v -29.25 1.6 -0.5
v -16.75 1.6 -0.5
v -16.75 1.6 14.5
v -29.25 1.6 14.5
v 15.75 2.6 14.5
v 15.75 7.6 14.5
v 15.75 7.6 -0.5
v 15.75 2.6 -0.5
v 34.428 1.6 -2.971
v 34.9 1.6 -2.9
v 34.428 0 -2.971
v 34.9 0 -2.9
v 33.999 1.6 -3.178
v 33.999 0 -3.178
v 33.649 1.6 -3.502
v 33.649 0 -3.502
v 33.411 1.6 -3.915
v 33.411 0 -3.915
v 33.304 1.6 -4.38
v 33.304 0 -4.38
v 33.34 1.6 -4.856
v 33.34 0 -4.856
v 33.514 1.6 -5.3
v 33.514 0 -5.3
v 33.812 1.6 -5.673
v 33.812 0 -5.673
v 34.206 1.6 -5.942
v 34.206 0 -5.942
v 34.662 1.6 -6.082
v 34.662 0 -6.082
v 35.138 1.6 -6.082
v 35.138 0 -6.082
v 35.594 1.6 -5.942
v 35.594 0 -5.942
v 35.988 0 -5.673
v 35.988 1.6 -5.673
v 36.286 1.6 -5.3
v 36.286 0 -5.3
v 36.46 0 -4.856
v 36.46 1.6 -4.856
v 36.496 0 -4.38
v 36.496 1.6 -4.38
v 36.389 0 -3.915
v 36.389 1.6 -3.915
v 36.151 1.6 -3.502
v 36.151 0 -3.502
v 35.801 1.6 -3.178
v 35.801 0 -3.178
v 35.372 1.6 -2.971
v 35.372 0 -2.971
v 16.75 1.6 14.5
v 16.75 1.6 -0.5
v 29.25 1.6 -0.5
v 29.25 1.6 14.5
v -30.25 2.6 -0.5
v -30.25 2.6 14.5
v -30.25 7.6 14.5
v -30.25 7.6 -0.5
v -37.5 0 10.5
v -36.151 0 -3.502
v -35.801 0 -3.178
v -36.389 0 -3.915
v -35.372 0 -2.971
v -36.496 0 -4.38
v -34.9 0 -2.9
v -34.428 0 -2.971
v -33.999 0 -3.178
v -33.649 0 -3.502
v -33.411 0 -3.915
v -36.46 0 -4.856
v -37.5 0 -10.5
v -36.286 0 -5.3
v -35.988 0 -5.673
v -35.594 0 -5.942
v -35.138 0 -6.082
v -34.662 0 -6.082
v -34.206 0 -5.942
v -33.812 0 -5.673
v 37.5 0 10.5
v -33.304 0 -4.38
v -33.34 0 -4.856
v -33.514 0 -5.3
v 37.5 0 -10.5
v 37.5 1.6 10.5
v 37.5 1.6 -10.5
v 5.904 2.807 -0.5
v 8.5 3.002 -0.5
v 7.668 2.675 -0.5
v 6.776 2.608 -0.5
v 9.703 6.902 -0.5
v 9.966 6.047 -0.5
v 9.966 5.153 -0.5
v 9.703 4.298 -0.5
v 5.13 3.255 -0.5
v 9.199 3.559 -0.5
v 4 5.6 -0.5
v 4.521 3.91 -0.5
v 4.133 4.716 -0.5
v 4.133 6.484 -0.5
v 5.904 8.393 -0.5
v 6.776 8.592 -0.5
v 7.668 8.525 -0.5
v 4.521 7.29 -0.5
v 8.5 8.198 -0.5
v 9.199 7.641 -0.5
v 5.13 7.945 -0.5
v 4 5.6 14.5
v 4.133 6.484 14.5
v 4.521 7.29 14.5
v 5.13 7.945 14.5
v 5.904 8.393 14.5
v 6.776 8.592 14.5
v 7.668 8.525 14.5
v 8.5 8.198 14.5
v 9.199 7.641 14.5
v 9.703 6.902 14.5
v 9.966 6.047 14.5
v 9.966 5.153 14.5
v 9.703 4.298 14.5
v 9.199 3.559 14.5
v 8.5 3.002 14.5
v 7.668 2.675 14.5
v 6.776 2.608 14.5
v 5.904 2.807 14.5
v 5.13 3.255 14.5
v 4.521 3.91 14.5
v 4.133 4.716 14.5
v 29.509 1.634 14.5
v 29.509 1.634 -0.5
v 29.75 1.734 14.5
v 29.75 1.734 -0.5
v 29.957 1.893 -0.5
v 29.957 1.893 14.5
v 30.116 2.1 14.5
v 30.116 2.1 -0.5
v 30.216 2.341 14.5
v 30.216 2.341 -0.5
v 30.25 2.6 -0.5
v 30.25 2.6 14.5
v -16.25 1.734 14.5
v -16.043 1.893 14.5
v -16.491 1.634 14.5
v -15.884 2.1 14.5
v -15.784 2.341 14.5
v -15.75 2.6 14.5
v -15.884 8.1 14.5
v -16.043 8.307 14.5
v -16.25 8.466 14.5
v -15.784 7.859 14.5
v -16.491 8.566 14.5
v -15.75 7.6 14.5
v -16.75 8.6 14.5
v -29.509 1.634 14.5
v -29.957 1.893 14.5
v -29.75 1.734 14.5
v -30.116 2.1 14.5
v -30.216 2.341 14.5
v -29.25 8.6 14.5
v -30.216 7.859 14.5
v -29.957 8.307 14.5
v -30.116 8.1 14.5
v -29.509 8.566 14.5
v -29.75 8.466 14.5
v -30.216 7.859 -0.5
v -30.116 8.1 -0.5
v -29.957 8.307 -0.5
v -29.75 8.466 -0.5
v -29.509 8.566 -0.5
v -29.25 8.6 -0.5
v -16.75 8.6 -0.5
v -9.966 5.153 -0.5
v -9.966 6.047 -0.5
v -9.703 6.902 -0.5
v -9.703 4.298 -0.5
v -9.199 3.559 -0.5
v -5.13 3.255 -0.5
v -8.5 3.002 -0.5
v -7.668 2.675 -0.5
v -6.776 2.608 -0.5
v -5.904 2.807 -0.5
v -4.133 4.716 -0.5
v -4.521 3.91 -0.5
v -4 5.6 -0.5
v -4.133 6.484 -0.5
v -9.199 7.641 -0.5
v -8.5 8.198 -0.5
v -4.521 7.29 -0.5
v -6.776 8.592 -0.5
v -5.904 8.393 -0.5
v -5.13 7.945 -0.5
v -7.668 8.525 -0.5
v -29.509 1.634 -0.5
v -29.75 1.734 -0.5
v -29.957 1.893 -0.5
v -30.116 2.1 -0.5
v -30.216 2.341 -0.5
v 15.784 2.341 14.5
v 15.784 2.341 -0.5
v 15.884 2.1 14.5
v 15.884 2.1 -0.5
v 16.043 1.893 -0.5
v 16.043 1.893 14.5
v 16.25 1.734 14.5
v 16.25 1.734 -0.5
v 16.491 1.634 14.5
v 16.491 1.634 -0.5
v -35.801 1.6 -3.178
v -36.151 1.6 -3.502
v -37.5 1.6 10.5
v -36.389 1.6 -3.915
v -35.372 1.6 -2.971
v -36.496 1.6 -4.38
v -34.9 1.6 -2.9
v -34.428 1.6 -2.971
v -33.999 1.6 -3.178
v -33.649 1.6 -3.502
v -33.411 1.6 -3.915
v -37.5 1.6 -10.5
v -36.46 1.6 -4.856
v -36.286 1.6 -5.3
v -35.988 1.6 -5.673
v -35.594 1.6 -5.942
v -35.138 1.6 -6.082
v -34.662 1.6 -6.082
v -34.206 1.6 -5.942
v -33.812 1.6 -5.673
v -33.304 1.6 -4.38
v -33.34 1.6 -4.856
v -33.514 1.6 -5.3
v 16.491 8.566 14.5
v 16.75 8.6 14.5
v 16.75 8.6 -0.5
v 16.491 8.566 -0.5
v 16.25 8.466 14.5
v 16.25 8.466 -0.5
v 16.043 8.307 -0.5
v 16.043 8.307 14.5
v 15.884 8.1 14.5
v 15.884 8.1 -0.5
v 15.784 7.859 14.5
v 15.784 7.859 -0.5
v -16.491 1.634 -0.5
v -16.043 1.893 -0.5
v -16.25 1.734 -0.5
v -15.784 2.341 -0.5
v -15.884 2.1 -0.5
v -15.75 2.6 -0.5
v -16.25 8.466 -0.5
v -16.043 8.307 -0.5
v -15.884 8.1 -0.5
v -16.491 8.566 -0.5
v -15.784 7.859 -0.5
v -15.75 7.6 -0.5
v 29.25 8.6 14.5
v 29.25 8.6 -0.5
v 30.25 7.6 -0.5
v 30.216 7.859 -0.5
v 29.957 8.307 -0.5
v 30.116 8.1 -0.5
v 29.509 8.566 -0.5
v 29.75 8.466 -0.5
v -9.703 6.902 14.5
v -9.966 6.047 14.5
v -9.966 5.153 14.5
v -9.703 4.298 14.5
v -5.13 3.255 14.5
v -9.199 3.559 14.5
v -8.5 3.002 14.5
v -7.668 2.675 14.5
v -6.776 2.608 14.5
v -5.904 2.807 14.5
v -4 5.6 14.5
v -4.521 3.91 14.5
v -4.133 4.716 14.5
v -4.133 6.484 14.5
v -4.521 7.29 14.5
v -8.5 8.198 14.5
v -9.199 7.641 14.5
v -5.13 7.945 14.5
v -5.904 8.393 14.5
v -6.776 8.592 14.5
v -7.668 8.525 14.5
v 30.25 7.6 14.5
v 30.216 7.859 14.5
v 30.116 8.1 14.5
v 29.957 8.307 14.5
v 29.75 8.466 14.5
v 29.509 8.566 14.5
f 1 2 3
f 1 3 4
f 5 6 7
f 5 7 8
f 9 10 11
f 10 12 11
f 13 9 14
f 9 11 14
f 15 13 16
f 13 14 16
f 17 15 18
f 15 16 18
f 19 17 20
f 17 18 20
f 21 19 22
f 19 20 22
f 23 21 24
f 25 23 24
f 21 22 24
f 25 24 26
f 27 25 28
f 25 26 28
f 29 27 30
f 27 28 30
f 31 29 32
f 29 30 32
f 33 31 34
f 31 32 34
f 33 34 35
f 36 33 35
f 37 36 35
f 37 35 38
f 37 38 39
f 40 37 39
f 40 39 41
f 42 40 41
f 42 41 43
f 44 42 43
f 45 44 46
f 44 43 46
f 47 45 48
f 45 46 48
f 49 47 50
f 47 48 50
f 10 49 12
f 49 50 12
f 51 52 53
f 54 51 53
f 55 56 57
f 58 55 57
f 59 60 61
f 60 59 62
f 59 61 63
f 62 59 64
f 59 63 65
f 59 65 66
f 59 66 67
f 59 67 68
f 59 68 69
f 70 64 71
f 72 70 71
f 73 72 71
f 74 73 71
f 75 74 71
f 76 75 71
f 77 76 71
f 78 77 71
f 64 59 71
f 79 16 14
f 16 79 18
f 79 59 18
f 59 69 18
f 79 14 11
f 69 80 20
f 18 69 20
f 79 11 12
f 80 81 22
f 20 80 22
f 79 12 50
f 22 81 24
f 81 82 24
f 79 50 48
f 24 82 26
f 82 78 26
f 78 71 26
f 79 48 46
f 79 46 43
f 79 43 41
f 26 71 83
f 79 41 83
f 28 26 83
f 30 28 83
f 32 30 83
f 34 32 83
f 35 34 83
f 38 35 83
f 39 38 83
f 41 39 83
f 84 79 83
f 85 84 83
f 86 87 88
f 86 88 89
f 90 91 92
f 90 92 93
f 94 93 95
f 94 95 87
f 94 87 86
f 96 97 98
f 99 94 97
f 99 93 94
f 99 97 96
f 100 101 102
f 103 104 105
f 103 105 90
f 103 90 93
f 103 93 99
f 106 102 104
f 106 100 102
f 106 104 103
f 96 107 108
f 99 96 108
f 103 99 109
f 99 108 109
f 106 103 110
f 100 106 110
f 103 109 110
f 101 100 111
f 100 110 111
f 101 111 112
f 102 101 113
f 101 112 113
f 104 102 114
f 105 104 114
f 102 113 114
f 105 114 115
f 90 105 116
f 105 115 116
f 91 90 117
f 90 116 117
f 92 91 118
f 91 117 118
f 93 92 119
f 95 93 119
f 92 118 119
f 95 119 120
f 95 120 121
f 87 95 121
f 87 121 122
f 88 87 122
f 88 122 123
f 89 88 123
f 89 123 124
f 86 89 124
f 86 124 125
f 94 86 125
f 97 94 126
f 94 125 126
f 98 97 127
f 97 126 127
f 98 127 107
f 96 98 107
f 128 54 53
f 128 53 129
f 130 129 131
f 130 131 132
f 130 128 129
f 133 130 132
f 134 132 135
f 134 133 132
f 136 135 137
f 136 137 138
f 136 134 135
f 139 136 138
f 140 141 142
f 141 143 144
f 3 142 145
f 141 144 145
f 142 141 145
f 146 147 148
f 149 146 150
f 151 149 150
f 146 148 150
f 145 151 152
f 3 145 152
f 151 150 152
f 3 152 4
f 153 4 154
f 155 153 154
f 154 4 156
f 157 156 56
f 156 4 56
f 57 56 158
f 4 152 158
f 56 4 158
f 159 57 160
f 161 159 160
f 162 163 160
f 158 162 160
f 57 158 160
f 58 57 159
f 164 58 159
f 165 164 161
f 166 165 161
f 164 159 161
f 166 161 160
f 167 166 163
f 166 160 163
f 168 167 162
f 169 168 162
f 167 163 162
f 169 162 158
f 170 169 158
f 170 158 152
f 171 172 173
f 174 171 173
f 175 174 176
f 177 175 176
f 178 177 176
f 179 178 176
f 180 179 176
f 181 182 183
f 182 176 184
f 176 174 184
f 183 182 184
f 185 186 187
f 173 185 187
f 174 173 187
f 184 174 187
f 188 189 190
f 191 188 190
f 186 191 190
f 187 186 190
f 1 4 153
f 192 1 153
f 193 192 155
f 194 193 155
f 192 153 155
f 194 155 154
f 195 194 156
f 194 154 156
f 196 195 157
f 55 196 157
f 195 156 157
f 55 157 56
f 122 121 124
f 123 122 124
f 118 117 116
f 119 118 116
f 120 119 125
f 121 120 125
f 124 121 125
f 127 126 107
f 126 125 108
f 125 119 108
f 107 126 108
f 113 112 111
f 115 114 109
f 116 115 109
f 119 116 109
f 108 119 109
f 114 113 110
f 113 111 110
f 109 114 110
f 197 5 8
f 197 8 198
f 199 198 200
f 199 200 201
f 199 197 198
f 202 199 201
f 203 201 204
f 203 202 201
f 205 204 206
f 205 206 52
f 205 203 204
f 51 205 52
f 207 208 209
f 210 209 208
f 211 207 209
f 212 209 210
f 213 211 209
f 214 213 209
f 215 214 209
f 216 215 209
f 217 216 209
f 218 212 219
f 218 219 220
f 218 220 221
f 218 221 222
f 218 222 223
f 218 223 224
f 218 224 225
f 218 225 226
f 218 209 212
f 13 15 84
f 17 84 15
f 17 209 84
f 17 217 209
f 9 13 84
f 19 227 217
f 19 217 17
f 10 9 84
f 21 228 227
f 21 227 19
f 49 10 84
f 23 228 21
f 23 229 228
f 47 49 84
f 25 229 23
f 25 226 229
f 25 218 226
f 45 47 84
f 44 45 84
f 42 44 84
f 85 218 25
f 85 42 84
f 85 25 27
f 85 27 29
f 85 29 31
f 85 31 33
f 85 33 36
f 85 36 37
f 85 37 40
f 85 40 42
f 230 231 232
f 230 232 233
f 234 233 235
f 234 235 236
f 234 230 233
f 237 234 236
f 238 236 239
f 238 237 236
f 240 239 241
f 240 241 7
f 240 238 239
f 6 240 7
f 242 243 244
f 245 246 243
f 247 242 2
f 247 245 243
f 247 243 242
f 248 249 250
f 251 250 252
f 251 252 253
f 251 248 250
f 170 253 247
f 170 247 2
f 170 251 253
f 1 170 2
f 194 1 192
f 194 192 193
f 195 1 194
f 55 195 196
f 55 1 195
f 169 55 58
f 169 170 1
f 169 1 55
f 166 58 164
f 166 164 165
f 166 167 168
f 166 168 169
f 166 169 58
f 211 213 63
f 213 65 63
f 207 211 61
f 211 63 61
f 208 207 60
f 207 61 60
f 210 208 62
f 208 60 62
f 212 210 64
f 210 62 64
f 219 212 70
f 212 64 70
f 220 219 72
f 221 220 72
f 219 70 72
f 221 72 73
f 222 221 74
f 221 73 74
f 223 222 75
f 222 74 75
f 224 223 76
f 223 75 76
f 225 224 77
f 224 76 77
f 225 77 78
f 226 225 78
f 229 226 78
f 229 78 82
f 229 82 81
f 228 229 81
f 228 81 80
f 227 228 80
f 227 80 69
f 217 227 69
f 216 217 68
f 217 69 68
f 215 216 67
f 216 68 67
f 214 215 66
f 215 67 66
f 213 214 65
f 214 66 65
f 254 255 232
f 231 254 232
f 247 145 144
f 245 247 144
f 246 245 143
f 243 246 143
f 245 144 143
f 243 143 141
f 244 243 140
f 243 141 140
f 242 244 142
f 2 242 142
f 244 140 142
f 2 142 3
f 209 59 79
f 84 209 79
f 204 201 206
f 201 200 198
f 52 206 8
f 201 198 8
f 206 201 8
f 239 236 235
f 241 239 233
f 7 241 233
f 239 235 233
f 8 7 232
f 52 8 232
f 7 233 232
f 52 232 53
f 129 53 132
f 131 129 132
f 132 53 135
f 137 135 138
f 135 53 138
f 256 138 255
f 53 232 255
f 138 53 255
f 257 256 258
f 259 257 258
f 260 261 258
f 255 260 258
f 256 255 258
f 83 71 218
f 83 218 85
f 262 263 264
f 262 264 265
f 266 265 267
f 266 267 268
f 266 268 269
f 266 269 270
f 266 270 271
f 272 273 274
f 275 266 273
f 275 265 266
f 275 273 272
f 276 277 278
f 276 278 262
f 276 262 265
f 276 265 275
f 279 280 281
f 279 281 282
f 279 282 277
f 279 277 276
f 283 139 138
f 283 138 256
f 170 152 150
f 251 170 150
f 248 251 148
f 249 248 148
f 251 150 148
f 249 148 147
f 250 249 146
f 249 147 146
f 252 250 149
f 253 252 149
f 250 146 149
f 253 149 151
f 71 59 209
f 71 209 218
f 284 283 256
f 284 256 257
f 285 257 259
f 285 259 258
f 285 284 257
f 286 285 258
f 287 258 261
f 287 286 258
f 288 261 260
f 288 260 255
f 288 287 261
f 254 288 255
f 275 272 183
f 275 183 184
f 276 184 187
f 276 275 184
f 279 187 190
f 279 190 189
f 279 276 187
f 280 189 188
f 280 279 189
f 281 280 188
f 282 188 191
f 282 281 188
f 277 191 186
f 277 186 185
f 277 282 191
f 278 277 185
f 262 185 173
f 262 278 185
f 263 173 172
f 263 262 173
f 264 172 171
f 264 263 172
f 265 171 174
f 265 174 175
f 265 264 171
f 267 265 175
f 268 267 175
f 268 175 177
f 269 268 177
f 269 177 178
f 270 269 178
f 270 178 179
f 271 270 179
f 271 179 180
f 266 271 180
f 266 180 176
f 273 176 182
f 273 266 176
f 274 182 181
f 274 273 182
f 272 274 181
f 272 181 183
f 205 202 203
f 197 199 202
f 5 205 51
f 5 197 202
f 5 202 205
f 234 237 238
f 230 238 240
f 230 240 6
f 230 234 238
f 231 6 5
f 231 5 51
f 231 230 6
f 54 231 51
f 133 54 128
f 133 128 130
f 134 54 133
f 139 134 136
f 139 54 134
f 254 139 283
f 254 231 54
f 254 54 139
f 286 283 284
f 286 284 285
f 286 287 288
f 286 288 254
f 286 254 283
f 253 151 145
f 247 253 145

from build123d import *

# Parameters (mm, degrees)
SKETCH1_W                     = 75
SKETCH1_H                     = 21
BOSS_EXTRUDE1_DEPTH           = 1.6
SKETCH2_R                     = 3
BOSS_EXTRUDE2_DEPTH           = 15
BOSS_EXTRUDE2_2_DEPTH         = 15
SKETCH4_W                     = 1.6
SKETCH4_H                     = 1.6
M3_CLEARANCE_HOLE1_AT_2_COUNT = 2
M3_CLEARANCE_HOLE1_AT_2_PITCH = 69.8


with BuildPart() as part:
    # Sketch1 → Boss-Extrude1 (new body)
    with BuildSketch(Plane(origin=(0, 0, 0), x_dir=(1, 0, 0), z_dir=(0, 1, 0))):
        Rectangle(SKETCH1_W, SKETCH1_H)
    extrude(amount=BOSS_EXTRUDE1_DEPTH)

    # Sketch4 → M3 Clearance Hole1 (revolve, cut)
    with BuildSketch(Plane(origin=(-34.9, 1.6, -4.5), x_dir=(0, 0, 1), z_dir=(1, 0, 0))):
        with Locations((0.8, 0.8)):
            Rectangle(SKETCH4_W, SKETCH4_H)
    m3_clearance_hole1 = revolve(axis=Axis((-34.9, 7.95, -4.5), (0, -1, 0)), mode=Mode.SUBTRACT)

    # M3 Clearance Hole1 at 2: M3 Clearance Hole1 ×2
    with Locations(*[(i * M3_CLEARANCE_HOLE1_AT_2_PITCH, 0, 0) for i in range(1, M3_CLEARANCE_HOLE1_AT_2_COUNT)]):
        add(m3_clearance_hole1, mode=Mode.SUBTRACT)


with BuildPart() as body_2:
    # Sketch2 → Boss-Extrude2 (new body)
    with BuildSketch(Plane.XY.offset(14.5)):
        with Locations((-7, 5.6)):
            Circle(SKETCH2_R)
    extrude(amount=-BOSS_EXTRUDE2_DEPTH)


with BuildPart() as body_3:
    # Sketch2 → Boss-Extrude2 2 (new body)
    with BuildSketch(Plane.XY.offset(14.5)):
        with BuildLine():
            Line((-29.25, 8.6), (-16.75, 8.6))
            ThreePointArc((-16.75, 8.6), (-16.042893219, 8.307106781), (-15.75, 7.6))
            Line((-15.75, 7.6), (-15.75, 2.6))
            ThreePointArc((-15.75, 2.6), (-16.042893219, 1.892893219), (-16.75, 1.6))
            Line((-16.75, 1.6), (-29.25, 1.6))
            ThreePointArc((-29.25, 1.6), (-29.957106781, 1.892893219), (-30.25, 2.6))
            Line((-30.25, 2.6), (-30.25, 7.6))
            ThreePointArc((-30.25, 7.6), (-29.957106781, 8.307106781), (-29.25, 8.6))
        make_face()
    extrude(amount=-BOSS_EXTRUDE2_2_DEPTH)


with BuildPart() as body_4:
    # Mirror13: mirrored copy
    add(body_3.part.mirror(Plane.ZY))


with BuildPart() as body_5:
    # Mirror13 2: mirrored copy
    add(body_2.part.mirror(Plane.ZY))


solid = Compound([part.part, body_2.part, body_3.part, body_4.part, body_5.part])
